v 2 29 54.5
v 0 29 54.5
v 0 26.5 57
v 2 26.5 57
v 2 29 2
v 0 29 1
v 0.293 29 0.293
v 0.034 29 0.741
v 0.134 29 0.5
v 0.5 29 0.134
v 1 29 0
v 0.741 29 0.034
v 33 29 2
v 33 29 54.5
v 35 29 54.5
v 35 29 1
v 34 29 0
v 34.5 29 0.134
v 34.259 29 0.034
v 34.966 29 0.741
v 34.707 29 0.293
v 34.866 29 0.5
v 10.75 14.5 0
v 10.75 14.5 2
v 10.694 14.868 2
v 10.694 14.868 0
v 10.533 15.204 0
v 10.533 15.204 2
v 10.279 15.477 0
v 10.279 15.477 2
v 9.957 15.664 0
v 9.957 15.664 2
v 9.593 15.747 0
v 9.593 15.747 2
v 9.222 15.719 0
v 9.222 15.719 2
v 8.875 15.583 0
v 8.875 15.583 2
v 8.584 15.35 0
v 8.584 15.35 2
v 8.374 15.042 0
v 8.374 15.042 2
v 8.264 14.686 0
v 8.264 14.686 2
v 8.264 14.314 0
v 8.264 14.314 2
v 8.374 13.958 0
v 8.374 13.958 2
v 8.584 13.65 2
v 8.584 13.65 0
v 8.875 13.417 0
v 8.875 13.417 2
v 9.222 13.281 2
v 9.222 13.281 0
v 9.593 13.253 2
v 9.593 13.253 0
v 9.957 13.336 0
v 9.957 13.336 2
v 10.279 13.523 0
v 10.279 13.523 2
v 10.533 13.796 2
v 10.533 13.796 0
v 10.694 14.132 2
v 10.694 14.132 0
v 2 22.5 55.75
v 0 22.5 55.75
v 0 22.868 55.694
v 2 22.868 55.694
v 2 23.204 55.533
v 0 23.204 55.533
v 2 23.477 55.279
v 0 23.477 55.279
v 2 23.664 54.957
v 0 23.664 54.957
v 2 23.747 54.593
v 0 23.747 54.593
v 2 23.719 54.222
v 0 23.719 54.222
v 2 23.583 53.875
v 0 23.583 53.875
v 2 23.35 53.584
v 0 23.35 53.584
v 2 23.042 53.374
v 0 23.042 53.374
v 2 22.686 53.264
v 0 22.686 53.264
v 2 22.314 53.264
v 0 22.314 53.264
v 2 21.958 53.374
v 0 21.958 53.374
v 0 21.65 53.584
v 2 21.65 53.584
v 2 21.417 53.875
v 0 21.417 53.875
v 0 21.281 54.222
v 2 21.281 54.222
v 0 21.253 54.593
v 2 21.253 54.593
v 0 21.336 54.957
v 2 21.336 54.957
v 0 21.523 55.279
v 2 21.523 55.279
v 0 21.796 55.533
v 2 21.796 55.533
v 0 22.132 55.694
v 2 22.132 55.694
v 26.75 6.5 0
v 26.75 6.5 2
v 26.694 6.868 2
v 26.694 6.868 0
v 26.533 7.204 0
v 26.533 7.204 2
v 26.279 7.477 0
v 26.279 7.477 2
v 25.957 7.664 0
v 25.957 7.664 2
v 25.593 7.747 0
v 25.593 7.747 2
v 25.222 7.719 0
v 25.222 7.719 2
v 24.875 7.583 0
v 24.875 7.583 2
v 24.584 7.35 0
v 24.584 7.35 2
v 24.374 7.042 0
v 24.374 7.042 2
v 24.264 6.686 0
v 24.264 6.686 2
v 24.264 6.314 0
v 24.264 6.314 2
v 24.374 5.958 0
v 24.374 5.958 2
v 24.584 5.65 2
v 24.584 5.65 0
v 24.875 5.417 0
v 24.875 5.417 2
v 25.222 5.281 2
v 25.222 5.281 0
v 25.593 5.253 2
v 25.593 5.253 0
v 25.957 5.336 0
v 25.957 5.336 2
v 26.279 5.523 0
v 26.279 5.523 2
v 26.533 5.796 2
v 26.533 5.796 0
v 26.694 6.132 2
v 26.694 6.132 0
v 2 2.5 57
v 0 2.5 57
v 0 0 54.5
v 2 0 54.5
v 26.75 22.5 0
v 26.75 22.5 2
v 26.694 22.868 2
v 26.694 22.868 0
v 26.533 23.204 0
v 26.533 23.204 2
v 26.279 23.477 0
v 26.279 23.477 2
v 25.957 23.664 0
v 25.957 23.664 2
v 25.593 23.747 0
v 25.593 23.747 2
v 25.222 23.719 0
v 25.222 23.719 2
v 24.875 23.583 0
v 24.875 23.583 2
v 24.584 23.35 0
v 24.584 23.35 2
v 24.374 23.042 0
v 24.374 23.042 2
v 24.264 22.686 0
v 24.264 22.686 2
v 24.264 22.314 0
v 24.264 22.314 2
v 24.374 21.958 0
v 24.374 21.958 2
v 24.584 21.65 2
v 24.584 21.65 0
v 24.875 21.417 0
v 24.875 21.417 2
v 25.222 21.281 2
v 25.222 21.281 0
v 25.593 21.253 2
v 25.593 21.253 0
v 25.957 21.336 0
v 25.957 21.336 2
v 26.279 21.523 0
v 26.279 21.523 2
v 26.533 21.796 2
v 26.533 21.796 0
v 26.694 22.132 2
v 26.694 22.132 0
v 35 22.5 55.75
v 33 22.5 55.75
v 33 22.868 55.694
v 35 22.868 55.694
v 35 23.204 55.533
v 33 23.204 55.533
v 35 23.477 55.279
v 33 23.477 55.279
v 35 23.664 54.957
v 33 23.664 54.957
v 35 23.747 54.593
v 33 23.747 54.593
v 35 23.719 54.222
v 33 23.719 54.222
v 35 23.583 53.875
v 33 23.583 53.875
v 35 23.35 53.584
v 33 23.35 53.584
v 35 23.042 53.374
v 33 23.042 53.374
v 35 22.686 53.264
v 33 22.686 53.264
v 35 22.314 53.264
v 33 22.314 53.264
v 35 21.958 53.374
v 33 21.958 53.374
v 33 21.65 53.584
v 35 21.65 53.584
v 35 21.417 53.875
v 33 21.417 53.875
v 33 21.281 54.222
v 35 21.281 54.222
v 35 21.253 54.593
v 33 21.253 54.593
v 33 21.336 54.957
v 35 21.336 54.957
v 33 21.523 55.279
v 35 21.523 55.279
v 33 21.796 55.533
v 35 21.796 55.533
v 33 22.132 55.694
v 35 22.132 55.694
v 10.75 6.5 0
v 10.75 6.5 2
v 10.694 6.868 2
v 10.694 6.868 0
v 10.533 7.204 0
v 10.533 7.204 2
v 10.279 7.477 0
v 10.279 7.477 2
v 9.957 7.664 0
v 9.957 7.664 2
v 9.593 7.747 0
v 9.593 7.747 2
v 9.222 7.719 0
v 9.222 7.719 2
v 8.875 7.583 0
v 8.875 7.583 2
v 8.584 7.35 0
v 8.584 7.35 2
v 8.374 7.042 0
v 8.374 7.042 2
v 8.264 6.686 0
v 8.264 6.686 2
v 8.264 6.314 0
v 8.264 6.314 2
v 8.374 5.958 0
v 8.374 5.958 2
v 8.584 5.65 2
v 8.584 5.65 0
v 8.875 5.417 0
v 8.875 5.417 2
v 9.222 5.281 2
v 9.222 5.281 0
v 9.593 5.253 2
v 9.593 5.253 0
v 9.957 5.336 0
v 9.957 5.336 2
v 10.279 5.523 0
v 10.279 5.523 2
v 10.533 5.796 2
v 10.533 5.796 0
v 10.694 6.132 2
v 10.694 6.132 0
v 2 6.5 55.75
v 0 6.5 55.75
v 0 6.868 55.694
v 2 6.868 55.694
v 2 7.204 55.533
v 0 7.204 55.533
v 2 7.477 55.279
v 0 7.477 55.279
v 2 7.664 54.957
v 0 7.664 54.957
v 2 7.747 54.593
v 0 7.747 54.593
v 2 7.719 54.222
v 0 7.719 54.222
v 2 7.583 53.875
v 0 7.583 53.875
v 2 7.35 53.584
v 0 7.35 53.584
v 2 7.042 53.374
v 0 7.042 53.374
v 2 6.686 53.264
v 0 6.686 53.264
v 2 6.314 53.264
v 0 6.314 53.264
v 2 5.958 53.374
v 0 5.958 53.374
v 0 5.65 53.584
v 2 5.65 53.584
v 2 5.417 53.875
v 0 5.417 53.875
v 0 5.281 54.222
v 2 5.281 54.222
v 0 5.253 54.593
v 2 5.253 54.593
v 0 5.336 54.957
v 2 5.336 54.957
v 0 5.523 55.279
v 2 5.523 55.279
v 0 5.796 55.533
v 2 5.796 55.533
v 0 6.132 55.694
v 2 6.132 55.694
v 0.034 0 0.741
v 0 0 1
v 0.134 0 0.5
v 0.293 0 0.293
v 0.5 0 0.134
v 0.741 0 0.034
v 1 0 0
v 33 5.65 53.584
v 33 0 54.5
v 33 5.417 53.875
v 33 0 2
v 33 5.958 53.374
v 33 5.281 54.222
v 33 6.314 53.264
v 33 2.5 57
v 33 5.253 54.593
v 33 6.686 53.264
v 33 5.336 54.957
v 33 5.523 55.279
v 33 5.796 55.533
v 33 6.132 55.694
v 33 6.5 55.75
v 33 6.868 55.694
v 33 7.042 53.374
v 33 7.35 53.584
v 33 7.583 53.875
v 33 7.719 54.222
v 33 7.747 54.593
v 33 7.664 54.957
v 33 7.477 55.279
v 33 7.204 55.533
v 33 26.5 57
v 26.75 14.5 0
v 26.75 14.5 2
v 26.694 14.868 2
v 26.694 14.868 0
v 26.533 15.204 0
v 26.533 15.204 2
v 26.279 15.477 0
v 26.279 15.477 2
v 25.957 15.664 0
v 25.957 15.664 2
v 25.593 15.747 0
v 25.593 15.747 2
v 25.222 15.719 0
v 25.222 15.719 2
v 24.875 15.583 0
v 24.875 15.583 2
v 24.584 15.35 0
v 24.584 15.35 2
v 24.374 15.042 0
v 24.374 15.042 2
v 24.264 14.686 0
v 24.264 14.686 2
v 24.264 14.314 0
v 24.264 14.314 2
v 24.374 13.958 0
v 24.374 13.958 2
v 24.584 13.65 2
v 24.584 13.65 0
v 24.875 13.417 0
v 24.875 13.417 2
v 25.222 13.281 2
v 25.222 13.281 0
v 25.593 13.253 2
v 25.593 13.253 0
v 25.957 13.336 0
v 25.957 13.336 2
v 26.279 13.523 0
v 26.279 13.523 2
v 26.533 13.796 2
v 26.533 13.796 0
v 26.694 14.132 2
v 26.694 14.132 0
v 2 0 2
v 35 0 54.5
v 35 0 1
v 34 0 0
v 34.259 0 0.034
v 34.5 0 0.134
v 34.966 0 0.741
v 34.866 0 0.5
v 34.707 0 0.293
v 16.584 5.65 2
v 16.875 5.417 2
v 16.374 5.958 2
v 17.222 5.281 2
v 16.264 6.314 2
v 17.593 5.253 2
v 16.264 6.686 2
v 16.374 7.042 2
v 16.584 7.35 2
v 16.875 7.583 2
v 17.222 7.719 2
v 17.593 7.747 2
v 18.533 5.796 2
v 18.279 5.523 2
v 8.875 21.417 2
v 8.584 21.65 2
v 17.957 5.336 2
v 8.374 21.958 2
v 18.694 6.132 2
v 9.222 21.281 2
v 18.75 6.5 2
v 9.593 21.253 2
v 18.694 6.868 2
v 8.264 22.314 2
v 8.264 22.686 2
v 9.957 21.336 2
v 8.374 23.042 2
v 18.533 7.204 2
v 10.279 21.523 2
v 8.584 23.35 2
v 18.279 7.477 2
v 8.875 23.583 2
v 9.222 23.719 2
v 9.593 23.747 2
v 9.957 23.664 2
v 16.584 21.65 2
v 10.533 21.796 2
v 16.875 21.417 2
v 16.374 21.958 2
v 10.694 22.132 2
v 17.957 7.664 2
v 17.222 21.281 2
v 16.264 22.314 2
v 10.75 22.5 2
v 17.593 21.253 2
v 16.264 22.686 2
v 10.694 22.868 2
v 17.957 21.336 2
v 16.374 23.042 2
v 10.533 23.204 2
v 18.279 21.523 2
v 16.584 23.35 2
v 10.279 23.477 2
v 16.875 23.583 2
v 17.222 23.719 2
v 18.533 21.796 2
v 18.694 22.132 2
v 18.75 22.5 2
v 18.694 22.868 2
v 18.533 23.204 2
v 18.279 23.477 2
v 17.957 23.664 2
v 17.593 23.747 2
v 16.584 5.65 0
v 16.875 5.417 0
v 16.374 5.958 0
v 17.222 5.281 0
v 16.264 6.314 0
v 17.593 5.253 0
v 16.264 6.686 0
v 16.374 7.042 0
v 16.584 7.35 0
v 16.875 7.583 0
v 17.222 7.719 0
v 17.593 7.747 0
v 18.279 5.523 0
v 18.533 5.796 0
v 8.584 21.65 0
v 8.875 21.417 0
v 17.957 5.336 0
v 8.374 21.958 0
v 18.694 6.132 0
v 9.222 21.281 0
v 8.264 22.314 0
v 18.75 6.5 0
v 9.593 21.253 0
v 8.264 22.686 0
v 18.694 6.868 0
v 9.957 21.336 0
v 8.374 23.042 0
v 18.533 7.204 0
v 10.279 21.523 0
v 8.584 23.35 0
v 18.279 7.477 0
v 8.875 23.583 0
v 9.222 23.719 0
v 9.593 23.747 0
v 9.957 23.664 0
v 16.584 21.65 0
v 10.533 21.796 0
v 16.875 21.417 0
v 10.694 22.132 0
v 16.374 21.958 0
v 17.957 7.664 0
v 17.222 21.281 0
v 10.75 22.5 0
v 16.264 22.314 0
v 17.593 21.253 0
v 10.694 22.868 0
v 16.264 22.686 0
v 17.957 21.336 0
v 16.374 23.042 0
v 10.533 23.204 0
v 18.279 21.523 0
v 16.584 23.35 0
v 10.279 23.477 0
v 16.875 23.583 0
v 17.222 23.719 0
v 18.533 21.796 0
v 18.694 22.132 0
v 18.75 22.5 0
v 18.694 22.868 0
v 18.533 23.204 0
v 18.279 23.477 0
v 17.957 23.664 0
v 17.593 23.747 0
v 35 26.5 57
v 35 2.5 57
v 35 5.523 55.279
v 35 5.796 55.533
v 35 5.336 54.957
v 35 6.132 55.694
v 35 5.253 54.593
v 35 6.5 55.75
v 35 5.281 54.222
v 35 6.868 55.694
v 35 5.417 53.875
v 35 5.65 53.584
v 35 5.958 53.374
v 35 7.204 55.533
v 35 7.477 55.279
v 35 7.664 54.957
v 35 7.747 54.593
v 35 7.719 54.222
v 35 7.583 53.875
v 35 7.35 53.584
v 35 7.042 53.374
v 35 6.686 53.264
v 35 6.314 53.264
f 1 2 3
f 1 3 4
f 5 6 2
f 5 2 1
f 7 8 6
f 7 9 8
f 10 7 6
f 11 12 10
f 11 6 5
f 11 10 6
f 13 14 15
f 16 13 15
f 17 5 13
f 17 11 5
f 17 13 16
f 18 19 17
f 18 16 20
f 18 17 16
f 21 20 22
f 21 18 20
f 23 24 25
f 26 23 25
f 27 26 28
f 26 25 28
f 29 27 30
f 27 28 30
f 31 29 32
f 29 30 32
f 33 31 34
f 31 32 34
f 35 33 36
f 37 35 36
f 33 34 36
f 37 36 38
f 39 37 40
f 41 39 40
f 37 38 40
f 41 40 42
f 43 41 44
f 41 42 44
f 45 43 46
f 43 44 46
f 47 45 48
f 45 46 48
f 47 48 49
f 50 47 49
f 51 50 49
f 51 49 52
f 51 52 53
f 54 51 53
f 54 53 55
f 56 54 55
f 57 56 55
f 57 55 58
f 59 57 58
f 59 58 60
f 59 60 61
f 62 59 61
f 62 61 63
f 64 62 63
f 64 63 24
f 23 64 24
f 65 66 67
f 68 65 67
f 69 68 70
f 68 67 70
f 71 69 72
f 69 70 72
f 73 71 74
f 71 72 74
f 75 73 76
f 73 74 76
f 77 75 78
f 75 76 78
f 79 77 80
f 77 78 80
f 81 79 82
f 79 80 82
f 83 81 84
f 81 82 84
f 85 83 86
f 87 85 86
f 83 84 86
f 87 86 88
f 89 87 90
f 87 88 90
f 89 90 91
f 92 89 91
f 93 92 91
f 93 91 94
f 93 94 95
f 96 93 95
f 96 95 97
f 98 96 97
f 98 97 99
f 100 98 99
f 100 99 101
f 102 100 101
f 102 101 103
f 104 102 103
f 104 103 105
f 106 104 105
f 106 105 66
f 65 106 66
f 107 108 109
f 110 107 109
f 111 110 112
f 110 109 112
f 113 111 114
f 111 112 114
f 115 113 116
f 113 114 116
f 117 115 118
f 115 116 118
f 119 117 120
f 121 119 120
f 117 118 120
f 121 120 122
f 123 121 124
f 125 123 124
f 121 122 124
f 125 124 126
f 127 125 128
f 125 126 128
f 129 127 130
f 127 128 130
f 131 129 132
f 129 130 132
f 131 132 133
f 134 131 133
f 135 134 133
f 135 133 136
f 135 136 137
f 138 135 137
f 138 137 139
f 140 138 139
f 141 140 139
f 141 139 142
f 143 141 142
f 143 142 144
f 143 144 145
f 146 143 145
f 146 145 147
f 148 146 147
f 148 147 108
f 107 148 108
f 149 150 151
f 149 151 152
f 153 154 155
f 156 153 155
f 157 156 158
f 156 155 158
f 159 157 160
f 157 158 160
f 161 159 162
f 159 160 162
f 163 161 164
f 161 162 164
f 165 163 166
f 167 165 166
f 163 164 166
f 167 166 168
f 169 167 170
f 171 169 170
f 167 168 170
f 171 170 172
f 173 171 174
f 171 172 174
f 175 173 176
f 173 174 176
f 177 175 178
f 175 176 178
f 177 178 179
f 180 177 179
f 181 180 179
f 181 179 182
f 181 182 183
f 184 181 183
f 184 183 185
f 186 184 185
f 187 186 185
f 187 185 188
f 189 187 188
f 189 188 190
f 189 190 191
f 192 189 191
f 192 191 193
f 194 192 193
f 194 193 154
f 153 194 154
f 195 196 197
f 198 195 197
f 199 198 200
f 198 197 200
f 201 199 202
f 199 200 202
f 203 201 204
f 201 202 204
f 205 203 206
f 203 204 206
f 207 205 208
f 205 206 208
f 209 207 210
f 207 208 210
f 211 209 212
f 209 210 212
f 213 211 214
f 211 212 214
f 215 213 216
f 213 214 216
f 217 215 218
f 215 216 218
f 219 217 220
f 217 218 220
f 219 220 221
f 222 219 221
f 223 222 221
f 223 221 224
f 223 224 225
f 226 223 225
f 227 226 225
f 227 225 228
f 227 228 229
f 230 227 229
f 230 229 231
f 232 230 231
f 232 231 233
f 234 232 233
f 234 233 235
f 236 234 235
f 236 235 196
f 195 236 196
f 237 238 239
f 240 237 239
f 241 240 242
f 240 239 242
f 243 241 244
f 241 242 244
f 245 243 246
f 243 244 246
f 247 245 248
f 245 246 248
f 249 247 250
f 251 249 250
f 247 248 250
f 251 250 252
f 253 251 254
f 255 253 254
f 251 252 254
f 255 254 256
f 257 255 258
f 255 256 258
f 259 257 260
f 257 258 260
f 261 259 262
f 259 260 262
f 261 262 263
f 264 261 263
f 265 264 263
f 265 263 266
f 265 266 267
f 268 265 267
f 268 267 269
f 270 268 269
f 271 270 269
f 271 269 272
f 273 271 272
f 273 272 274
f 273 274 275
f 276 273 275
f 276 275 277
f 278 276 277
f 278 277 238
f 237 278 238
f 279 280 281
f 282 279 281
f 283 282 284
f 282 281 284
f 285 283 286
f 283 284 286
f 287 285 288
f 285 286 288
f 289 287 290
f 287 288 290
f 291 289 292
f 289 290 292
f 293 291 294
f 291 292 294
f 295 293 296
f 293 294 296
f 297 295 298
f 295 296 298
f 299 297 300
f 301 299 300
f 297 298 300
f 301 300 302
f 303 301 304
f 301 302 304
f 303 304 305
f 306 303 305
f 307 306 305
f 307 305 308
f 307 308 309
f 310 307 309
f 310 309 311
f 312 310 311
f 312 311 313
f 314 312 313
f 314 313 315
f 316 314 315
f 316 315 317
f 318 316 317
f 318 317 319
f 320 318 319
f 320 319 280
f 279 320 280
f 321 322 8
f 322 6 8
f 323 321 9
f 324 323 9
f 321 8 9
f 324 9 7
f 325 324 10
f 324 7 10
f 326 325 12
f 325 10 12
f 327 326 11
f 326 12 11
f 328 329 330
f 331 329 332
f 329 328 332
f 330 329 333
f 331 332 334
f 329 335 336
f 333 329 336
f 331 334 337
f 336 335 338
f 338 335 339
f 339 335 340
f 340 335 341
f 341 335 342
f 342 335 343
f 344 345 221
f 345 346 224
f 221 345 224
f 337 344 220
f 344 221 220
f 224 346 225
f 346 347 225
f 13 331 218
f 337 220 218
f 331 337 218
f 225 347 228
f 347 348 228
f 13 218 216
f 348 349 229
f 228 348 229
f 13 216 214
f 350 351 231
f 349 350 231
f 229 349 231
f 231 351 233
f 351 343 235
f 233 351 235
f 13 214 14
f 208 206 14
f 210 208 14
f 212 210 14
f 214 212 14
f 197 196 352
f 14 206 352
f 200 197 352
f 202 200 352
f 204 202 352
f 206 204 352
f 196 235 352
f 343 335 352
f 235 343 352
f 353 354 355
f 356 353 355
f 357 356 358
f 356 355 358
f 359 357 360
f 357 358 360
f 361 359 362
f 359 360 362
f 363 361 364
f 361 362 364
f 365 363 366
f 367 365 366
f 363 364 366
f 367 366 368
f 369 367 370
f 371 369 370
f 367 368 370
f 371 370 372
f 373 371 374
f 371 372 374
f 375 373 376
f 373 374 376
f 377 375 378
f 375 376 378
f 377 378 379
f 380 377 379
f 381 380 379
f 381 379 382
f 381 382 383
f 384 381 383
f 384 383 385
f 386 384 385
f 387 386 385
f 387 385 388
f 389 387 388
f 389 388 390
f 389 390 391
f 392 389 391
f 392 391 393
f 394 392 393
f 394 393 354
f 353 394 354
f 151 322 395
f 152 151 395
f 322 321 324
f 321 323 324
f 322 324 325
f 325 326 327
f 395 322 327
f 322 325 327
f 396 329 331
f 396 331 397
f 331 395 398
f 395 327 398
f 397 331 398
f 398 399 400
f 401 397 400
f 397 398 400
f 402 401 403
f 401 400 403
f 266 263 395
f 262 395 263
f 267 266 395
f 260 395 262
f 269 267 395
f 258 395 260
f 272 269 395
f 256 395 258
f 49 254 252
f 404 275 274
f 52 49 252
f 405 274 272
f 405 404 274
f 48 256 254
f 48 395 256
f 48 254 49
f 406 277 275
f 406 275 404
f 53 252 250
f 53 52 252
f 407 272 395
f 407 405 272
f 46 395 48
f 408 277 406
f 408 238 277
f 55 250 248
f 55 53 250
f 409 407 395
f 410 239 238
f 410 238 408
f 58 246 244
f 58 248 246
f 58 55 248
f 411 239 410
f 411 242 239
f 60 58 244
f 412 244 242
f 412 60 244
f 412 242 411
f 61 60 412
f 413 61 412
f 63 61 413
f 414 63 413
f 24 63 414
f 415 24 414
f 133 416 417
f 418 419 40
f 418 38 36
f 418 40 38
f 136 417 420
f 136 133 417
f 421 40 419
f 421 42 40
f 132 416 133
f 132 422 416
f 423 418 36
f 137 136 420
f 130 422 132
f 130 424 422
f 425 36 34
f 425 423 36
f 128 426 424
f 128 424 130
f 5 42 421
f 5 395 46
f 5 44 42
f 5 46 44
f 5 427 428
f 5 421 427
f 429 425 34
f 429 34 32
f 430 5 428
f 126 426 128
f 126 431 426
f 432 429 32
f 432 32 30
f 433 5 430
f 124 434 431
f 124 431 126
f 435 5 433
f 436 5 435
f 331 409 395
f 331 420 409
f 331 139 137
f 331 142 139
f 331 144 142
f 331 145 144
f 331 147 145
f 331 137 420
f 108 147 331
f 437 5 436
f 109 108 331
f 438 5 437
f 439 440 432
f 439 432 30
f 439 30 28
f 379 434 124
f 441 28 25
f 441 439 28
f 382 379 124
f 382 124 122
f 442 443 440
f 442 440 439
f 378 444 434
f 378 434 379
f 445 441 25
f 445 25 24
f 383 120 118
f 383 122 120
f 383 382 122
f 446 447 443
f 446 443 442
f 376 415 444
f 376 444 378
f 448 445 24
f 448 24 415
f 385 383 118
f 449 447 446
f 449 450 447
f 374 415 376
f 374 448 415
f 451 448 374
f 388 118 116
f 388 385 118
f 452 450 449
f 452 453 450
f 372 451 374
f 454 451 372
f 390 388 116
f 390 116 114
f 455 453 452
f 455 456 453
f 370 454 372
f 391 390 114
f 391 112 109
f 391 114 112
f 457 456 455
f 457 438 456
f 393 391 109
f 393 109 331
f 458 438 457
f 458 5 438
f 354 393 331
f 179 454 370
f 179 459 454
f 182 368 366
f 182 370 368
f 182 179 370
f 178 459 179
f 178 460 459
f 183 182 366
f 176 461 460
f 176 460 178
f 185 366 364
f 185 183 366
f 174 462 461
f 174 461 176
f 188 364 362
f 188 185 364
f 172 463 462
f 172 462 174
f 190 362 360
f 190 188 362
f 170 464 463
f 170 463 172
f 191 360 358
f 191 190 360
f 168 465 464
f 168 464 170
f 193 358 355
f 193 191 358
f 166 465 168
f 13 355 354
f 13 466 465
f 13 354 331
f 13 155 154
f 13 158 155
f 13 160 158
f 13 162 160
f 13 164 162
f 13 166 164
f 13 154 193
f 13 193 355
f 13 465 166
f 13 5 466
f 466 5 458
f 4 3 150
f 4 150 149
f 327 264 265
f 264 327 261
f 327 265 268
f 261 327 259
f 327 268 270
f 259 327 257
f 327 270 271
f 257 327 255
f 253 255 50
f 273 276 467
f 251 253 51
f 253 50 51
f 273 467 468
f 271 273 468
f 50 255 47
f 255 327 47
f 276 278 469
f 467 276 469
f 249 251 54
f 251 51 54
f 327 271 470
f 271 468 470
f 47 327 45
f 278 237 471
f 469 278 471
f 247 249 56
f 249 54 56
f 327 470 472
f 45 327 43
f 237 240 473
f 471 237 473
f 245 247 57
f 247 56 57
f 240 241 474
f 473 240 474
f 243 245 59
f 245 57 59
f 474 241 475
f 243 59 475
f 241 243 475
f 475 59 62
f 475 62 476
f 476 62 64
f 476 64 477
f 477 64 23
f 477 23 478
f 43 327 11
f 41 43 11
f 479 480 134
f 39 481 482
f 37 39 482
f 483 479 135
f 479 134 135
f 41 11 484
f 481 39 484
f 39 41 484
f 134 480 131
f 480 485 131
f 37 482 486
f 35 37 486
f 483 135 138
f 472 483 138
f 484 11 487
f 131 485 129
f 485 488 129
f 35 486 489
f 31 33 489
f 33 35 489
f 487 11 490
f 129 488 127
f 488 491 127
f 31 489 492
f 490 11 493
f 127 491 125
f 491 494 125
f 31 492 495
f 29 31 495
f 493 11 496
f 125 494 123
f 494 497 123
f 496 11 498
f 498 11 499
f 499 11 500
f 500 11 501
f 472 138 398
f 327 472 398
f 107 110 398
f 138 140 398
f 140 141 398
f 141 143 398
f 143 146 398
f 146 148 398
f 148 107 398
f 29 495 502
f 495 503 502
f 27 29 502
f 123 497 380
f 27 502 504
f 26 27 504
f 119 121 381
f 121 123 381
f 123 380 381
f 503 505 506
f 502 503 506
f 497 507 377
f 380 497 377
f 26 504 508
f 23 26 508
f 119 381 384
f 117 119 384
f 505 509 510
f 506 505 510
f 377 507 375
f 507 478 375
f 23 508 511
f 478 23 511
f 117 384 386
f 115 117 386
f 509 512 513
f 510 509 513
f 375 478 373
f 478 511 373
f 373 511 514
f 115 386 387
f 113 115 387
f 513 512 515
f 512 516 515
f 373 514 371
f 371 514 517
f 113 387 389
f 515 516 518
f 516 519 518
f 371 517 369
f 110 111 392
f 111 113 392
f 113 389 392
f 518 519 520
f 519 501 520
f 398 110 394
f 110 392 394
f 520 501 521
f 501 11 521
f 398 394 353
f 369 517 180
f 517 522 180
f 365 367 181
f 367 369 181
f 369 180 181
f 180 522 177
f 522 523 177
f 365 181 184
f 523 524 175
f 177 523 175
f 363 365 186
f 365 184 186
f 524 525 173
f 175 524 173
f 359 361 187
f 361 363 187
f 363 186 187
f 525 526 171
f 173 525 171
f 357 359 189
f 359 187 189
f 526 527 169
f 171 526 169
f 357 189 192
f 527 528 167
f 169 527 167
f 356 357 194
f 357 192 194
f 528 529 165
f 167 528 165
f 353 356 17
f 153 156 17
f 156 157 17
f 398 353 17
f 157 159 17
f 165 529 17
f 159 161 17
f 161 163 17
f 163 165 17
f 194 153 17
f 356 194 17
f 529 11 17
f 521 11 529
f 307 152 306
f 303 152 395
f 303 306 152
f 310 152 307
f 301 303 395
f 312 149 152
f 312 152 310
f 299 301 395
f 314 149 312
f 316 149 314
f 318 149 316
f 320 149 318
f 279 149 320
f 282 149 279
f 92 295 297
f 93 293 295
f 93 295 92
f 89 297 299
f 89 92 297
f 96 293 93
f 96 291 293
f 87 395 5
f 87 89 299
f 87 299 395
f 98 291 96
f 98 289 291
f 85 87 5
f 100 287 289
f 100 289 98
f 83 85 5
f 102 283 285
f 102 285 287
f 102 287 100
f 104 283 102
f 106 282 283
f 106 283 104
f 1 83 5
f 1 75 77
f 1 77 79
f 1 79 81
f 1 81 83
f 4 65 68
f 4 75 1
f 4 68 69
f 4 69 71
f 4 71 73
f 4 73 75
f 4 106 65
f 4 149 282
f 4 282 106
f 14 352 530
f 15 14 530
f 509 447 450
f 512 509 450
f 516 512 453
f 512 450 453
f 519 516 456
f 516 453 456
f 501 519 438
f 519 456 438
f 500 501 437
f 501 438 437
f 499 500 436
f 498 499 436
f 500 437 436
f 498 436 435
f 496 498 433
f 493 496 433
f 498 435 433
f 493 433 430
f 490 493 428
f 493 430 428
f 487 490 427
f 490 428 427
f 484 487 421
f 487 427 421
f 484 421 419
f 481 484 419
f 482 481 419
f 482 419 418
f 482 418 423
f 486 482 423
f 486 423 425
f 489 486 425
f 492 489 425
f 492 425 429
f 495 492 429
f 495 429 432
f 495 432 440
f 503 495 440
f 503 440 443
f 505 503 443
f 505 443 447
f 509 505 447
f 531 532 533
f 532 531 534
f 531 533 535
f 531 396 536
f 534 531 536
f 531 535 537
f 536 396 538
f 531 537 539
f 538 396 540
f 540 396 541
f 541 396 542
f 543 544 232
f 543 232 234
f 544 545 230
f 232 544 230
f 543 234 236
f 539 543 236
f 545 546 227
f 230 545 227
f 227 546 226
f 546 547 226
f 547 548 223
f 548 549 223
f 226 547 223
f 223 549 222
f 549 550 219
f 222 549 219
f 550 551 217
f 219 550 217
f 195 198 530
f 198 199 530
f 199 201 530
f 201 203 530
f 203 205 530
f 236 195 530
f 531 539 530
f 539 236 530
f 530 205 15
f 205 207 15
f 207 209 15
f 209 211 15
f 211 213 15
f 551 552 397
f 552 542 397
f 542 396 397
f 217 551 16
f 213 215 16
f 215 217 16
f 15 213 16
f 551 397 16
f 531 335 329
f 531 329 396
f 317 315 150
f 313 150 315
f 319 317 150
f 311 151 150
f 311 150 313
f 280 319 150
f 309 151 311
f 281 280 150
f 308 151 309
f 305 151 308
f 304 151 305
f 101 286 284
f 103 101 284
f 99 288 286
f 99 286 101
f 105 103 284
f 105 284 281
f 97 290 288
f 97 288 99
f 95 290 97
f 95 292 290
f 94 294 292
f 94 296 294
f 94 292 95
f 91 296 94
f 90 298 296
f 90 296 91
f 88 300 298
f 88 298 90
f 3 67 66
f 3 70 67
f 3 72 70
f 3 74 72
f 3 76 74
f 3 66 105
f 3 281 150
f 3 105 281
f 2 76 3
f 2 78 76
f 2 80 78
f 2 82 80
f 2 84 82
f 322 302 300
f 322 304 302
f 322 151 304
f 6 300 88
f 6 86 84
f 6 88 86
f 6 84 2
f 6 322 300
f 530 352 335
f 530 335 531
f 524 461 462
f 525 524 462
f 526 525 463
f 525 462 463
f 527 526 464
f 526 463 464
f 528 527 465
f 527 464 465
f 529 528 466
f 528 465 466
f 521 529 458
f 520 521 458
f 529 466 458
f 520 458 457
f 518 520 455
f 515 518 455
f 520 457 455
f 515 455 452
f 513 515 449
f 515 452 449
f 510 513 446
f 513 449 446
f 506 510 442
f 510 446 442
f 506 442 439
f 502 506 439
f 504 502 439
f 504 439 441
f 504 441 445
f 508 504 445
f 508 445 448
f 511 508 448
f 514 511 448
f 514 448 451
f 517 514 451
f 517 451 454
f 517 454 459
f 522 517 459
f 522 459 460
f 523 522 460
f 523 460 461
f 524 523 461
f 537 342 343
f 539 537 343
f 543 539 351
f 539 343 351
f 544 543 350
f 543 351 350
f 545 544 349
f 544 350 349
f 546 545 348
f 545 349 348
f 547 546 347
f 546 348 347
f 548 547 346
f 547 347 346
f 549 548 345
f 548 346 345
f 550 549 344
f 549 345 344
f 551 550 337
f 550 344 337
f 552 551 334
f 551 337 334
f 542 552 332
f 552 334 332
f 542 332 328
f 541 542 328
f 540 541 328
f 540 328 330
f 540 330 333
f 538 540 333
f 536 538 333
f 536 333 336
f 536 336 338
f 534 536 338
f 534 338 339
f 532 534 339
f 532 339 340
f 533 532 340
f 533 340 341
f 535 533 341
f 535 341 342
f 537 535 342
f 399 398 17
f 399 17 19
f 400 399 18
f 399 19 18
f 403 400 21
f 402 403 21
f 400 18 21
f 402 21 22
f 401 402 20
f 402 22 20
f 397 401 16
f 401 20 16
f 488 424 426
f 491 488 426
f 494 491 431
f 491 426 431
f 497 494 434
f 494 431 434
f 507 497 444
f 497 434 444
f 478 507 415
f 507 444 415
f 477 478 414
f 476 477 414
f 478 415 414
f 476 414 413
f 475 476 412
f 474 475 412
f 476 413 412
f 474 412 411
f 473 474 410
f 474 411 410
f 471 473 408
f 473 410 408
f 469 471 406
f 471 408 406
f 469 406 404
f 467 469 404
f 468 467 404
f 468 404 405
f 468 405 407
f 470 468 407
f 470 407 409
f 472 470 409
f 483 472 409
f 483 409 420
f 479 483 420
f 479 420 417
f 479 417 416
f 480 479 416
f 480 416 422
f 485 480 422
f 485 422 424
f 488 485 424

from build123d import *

# Parameters (mm, degrees)
SKETCH1_W           = 35
SKETCH1_H           = 29
BOSS_EXTRUDE1_DEPTH = 57
SKETCH3_W           = 31
SKETCH3_H           = 29
CUT_EXTRUDE1_DEPTH  = 55
FILLET1_R           = 1
CHAMFER1_SIZE       = 2.5
SKETCH4_R           = 1.25
CUT_EXTRUDE2_DEPTH  = 40.5
SKETCH7_R           = 1.25
CUT_EXTRUDE3_DEPTH  = 5


with BuildPart() as part:
    # Sketch1 → Boss-Extrude1 (new body)
    with BuildSketch(Plane.XY):
        with Locations((17.5, 14.5)):
            Rectangle(SKETCH1_W, SKETCH1_H)
    extrude(amount=BOSS_EXTRUDE1_DEPTH)

    # Sketch3 → Cut-Extrude1 (cut)
    with BuildSketch(Plane.XY.offset(57)):
        with Locations((17.5, 14.5)):
            Rectangle(SKETCH3_W, SKETCH3_H)
    extrude(amount=-CUT_EXTRUDE1_DEPTH, mode=Mode.SUBTRACT)

    # Fillet1
    fillet1_edges = [part.edges().sort_by_distance(p)[0] for p in [
        (0, 14.5, 0),
        (35, 14.5, 0),
    ]]
    fillet(fillet1_edges, radius=FILLET1_R)

    # Chamfer1
    chamfer1_edges = [part.edges().sort_by_distance(p)[0] for p in [
        (1, 0, 57),
        (1, 29, 57),
        (34, 0, 57),
        (34, 29, 57),
    ]]
    chamfer(chamfer1_edges, length=CHAMFER1_SIZE)

    # Sketch4 → Cut-Extrude2 (cut)
    with BuildSketch(Plane.ZY):
        with Locations((54.5, 22.5)):
            Circle(SKETCH4_R)
        with Locations((54.5, 6.5)):
            Circle(SKETCH4_R)
    extrude(amount=-CUT_EXTRUDE2_DEPTH, mode=Mode.SUBTRACT)

    # Sketch7 → Cut-Extrude3 (cut)
    with BuildSketch(Plane.XY.offset(2)):
        with Locations((9.5, 6.5)):
            Circle(SKETCH7_R)
        with Locations((17.5, 6.5)):
            Circle(SKETCH7_R)
        with Locations((25.5, 6.5)):
            Circle(SKETCH7_R)
        with Locations((25.5, 14.5)):
            Circle(SKETCH7_R)
        with Locations((17.5, 22.5)):
            Circle(SKETCH7_R)
        with Locations((25.5, 22.5)):
            Circle(SKETCH7_R)
        with Locations((9.5, 14.5)):
            Circle(SKETCH7_R)
        with Locations((9.5, 22.5)):
            Circle(SKETCH7_R)
    extrude(amount=-CUT_EXTRUDE3_DEPTH, mode=Mode.SUBTRACT)


solid = part.part
